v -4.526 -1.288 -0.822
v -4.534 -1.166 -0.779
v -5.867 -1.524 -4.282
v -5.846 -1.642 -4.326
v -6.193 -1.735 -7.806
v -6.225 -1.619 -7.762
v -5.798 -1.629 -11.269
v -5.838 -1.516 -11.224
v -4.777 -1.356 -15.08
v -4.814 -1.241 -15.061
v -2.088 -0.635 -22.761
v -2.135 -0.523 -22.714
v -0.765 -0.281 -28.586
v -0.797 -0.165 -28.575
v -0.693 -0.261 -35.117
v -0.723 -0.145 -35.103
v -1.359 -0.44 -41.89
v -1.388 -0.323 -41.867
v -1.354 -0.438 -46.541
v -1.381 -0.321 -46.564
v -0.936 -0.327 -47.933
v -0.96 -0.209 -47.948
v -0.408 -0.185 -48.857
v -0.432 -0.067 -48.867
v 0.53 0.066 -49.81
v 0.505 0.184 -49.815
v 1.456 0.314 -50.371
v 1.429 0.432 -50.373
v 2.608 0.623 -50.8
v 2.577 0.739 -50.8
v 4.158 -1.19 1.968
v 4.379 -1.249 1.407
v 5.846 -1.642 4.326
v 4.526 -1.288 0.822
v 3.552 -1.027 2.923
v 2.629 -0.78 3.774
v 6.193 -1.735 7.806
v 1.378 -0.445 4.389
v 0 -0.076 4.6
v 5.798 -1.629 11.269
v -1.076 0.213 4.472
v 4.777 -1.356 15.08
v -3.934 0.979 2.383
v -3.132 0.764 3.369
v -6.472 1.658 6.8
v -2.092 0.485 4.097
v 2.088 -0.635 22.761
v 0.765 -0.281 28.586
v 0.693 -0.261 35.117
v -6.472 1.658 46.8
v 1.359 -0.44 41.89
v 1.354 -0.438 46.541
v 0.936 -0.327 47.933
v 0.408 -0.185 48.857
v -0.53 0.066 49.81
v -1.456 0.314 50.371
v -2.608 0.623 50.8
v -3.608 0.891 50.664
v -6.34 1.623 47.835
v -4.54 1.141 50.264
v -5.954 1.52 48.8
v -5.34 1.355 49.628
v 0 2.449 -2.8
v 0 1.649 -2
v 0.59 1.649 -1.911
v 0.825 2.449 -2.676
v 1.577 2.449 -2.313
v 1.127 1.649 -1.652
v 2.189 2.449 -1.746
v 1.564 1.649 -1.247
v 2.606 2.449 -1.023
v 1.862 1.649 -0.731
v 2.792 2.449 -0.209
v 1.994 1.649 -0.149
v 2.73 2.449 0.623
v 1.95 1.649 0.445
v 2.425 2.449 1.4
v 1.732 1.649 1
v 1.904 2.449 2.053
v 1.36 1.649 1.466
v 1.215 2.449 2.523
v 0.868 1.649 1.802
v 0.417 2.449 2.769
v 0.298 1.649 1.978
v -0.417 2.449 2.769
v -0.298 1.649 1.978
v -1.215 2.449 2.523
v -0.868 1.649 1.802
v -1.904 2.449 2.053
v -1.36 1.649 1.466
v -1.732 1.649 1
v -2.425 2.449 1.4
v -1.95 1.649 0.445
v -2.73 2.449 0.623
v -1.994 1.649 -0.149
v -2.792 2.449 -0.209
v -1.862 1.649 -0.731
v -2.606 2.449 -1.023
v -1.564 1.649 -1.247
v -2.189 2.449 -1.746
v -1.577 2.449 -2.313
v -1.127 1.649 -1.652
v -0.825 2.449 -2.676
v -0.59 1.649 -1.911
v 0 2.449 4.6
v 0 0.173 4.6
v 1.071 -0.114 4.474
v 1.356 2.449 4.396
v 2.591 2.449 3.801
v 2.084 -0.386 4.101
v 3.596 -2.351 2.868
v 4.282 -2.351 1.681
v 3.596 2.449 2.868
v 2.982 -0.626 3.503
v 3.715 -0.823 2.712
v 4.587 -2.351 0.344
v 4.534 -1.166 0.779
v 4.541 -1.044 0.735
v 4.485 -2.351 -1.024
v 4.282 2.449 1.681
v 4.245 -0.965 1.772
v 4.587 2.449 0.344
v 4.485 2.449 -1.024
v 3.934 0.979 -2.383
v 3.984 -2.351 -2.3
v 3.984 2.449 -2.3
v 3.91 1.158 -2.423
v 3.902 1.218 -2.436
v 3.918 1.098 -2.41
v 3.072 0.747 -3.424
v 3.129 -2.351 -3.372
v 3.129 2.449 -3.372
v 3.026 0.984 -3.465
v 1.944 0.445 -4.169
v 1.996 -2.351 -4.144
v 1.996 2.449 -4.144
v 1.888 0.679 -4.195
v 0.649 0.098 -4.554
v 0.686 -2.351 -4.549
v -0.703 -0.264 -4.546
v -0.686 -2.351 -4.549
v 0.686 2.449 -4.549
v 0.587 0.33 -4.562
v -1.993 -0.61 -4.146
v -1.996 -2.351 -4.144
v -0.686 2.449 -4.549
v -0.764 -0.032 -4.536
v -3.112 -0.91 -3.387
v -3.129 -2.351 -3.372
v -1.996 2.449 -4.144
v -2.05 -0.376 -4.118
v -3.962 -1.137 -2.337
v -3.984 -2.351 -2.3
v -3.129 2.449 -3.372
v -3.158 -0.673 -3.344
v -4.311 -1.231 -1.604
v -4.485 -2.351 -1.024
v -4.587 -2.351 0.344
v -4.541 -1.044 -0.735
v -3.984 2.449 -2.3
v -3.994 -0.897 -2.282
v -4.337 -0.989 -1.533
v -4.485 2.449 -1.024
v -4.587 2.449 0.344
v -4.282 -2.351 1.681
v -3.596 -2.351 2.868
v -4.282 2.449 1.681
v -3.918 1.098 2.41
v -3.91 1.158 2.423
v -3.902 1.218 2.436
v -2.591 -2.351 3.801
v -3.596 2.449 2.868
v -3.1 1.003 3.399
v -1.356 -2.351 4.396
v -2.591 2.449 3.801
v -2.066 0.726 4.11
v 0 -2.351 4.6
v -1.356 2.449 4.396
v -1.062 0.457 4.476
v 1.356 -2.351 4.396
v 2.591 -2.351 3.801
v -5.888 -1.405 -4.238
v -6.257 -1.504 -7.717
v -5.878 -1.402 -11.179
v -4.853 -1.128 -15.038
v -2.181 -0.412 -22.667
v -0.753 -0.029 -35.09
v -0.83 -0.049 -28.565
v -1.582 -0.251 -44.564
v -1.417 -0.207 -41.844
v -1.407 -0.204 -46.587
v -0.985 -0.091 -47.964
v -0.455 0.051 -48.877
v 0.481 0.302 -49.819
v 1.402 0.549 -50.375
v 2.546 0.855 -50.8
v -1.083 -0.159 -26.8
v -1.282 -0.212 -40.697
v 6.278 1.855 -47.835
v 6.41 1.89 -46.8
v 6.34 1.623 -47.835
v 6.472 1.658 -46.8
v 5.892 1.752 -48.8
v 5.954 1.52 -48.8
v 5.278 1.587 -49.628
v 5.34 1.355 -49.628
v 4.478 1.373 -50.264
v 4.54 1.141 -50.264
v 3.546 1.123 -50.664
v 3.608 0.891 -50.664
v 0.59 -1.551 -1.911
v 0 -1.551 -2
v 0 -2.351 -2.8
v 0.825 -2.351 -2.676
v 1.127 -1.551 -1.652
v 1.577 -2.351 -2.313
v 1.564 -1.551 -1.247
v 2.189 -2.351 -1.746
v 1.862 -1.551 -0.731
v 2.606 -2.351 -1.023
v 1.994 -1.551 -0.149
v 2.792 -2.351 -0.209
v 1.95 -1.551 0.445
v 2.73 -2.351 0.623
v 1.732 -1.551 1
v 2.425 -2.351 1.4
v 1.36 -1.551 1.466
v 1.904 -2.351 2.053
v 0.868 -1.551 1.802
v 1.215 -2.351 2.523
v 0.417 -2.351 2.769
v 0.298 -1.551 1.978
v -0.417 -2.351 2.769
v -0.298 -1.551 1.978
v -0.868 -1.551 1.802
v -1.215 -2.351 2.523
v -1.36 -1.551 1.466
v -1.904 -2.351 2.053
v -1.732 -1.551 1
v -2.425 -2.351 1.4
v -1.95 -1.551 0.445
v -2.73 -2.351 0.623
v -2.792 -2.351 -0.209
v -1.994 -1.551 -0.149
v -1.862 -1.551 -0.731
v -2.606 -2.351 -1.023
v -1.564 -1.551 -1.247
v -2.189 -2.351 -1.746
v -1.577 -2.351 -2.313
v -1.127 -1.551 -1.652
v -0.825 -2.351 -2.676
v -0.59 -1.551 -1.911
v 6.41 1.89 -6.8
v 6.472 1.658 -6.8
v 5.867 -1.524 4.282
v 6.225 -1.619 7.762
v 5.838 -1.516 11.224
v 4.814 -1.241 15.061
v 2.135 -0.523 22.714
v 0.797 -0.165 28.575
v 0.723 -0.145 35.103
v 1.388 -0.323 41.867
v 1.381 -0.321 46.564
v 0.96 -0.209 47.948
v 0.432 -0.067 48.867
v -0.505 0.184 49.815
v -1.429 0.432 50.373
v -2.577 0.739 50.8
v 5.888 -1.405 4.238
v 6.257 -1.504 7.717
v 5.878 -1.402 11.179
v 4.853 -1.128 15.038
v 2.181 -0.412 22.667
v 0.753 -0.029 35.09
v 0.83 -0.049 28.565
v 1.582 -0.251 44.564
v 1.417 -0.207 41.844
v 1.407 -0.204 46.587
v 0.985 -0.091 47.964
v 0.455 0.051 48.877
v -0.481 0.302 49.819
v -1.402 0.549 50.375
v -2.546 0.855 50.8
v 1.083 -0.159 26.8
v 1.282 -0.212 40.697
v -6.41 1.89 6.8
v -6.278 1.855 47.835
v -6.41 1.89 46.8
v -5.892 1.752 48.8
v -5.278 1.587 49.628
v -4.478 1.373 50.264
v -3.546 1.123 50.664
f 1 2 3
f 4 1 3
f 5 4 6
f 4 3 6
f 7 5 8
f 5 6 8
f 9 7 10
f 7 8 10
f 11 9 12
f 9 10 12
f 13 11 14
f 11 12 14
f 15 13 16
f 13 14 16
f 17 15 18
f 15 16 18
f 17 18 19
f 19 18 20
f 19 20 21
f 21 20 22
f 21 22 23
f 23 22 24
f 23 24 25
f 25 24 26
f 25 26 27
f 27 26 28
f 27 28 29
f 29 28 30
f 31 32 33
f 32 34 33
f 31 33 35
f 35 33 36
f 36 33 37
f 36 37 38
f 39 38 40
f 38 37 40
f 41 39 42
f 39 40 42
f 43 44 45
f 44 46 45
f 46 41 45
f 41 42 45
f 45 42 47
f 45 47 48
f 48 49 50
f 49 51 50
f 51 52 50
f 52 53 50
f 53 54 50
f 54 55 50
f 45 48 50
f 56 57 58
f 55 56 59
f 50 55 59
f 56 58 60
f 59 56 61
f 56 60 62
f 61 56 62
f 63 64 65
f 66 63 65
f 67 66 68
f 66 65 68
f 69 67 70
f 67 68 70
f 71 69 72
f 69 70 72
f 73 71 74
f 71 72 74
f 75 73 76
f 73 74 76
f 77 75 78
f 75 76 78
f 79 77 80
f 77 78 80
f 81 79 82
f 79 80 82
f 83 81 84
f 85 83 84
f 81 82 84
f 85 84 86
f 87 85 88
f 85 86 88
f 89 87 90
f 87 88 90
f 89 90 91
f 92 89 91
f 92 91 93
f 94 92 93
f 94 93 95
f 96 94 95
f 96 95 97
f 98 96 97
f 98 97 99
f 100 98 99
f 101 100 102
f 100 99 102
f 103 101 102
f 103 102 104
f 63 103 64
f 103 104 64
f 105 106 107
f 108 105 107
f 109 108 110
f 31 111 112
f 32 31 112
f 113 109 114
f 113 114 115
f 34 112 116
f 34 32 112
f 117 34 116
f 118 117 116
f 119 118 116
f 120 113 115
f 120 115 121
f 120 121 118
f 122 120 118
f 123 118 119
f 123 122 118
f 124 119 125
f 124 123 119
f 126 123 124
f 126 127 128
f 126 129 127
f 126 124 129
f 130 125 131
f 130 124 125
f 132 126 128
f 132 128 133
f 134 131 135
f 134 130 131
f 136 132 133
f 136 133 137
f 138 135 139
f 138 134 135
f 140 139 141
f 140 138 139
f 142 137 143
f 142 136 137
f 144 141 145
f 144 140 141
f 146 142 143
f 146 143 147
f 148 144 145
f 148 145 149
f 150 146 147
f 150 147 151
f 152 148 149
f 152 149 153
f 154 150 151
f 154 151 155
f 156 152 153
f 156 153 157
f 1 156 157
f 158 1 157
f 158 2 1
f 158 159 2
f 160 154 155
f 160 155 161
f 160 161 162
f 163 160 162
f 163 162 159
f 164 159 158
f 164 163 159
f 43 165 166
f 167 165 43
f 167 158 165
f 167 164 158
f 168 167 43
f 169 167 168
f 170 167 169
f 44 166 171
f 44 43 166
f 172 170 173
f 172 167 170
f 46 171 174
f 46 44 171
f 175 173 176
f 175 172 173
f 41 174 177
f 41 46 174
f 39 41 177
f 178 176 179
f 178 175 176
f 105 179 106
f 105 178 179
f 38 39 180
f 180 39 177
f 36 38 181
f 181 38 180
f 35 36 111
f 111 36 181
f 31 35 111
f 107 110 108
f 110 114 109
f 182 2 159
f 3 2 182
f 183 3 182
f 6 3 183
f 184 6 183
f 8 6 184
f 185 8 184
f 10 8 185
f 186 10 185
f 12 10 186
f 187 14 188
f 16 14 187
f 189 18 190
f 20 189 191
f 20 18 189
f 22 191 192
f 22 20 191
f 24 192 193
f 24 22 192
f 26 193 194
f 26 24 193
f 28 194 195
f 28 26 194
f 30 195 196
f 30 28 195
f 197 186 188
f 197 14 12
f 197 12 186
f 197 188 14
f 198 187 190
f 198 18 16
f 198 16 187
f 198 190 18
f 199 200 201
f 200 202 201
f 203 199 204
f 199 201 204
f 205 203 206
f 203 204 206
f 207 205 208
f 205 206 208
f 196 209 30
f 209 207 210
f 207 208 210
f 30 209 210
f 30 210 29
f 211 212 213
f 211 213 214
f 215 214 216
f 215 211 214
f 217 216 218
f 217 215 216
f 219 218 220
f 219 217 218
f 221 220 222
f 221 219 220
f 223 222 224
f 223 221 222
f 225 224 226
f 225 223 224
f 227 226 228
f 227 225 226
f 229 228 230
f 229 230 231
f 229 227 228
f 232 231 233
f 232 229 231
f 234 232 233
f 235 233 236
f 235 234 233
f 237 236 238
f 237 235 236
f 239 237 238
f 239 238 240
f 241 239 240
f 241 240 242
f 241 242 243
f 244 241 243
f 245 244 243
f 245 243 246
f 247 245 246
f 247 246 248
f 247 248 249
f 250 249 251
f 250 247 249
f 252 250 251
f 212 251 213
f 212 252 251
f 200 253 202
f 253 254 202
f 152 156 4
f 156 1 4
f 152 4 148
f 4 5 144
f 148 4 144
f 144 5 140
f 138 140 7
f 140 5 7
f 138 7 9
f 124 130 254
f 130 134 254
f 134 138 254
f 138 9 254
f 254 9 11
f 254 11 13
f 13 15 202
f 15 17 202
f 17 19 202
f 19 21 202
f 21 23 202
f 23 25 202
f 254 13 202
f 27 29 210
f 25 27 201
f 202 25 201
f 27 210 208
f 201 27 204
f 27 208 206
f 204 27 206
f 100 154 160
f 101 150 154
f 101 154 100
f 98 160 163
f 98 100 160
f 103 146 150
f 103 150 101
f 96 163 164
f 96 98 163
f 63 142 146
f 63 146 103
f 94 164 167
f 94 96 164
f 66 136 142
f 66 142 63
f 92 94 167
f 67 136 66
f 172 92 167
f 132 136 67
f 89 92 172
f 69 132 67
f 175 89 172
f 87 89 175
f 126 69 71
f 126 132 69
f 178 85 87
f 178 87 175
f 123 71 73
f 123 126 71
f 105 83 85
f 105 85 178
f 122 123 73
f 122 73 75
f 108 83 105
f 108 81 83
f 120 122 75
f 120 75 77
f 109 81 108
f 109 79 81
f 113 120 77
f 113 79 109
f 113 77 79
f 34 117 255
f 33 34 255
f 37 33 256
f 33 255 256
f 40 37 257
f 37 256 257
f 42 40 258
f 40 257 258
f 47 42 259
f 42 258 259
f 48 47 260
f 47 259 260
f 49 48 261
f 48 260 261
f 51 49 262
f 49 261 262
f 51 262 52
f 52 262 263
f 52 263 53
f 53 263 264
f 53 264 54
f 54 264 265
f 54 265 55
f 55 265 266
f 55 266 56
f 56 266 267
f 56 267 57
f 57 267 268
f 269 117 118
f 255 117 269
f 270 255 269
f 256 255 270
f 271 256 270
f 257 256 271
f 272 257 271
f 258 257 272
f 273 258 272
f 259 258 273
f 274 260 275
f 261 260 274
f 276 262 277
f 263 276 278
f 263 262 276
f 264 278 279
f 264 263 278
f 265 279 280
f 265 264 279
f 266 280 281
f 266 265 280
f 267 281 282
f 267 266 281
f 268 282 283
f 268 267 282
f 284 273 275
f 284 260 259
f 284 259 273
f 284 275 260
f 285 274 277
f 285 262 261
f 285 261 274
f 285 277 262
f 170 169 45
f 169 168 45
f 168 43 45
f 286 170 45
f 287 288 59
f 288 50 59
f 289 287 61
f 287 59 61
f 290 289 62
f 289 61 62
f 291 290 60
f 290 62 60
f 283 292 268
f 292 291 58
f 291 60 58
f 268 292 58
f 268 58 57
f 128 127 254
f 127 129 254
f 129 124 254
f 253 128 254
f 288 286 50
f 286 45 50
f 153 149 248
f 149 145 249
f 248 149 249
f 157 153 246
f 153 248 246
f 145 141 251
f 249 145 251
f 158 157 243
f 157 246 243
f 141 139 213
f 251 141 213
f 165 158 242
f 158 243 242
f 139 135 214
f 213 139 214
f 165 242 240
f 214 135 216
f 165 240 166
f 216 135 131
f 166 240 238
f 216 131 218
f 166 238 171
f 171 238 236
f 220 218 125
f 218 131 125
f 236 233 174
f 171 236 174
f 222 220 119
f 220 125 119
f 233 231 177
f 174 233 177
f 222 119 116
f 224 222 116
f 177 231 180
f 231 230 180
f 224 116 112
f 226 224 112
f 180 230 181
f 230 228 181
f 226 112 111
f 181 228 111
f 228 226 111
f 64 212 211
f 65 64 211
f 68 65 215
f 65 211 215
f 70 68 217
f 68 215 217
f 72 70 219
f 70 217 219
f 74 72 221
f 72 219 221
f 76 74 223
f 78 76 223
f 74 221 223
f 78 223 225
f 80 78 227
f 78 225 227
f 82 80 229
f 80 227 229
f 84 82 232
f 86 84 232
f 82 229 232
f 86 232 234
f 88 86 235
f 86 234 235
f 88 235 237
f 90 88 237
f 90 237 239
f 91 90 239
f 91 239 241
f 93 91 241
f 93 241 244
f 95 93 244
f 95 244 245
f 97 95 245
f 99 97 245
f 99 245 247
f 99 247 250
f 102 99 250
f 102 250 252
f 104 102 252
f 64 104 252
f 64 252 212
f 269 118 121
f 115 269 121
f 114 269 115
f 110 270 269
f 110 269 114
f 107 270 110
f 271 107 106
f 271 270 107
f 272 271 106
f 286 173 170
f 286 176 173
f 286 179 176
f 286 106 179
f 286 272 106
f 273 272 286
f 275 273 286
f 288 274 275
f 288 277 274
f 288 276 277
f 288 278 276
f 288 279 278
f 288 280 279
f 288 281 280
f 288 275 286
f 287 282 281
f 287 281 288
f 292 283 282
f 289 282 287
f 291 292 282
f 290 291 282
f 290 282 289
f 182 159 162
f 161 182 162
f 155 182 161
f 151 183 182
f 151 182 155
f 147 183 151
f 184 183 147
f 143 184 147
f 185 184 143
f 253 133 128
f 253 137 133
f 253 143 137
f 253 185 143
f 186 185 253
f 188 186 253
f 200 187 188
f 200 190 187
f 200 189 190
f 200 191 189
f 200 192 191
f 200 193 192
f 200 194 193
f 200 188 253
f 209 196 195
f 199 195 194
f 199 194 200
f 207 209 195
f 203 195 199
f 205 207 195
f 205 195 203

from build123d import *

# Parameters (mm, degrees)
SKETCH1_R           = 5.75
BOSS_EXTRUDE1_DEPTH = 3
BOSS_EXTRUDE2_DEPTH = 0.15
CIRPATTERN1_COUNT   = 2
SKETCH4_R           = 2.5
CUT_EXTRUDE1_DEPTH  = 65.293804857
CHAMFER1_SIZE       = 1
SCALE1_SCALE        = 0.8


with BuildPart() as part:
    # Sketch1 → Boss-Extrude1 (new, symmetric)
    with BuildSketch(Plane(origin=(0, 0, 0), x_dir=(1, 0, 0), z_dir=(0, 1, 0))):
        with Locations(Location((0, 0, 0), (0, 0, 270))):
            Circle(SKETCH1_R)
    extrude(amount=BOSS_EXTRUDE1_DEPTH, both=True)

    # Sketch3 → Boss-Extrude2 (add, symmetric)
    with BuildSketch(Plane(origin=(0, 0, 0), x_dir=(0.9659258262890681, -0.25881904510252135, 0), z_dir=(-0.25881904510252135, -0.9659258262890681, 0))):
        with BuildLine():
            Line((-4.839914139, 2.623745504), (-8.334886543, 8.5))
            Line((-8.334886543, 8.5), (-8.334886543, 58.5))
            ThreePointArc((-8.334886543, 58.5), (-6.870420449, 62.035533906), (-3.334886543, 63.5))
            add(Edge.make_bspline(
                [(5.746982113, 0.761996319), (12.131355978, 11.850018821), (-0.936182392, 28.084027466), (1.461879649, 49.536058165), (2.906134653, 61.805968839), (-3.334886543, 63.5)],
                knots=[0, 0, 0, 0, 0.512789376, 0.775226186, 1, 1, 1, 1], degree=3))
            add(Edge.make_bspline(
                [(-4.839914139, 2.623745504), (-4.099694998, 4.029932723), (-0.024977129, 7.494277123), (5.216231685, 3.583159529), (5.746982113, 0.761996319)],
                knots=[0, 0, 0, 0, 0.356037784, 1, 1, 1, 1], degree=3))
        make_face()
    boss_extrude2 = extrude(amount=BOSS_EXTRUDE2_DEPTH, both=True)

    # CirPattern1: Boss-Extrude2 ×2 about axis
    cirpattern1_axis = Axis((0, 3, 0), (0, -1, 0))
    for i in range(1, CIRPATTERN1_COUNT):
        add(boss_extrude2.rotate(cirpattern1_axis, i * 360 / CIRPATTERN1_COUNT))

    # Sketch4 → Cut-Extrude1 (cut, through all)
    with BuildSketch(Plane.XZ.offset(3)):
        with Locations(Location((0, 0, 0), (0, 0, 270))):
            Circle(SKETCH4_R)
    extrude(amount=-CUT_EXTRUDE1_DEPTH, mode=Mode.SUBTRACT)

    # Chamfer1
    chamfer1_edges = [part.edges().sort_by_distance(p)[0] for p in [
        (0, 3, 2.5),
        (0, -3, 2.5),
    ]]
    chamfer(chamfer1_edges, length=CHAMFER1_SIZE)


with BuildPart() as part_1:
    # Scale1: scaled about (3.49e-07, 0.242843854, 1.5359e-05)
    add(part.part.scale(SCALE1_SCALE).moved(Location((7e-08, 0.048568771, 3.072e-06))))


solid = part_1.part
